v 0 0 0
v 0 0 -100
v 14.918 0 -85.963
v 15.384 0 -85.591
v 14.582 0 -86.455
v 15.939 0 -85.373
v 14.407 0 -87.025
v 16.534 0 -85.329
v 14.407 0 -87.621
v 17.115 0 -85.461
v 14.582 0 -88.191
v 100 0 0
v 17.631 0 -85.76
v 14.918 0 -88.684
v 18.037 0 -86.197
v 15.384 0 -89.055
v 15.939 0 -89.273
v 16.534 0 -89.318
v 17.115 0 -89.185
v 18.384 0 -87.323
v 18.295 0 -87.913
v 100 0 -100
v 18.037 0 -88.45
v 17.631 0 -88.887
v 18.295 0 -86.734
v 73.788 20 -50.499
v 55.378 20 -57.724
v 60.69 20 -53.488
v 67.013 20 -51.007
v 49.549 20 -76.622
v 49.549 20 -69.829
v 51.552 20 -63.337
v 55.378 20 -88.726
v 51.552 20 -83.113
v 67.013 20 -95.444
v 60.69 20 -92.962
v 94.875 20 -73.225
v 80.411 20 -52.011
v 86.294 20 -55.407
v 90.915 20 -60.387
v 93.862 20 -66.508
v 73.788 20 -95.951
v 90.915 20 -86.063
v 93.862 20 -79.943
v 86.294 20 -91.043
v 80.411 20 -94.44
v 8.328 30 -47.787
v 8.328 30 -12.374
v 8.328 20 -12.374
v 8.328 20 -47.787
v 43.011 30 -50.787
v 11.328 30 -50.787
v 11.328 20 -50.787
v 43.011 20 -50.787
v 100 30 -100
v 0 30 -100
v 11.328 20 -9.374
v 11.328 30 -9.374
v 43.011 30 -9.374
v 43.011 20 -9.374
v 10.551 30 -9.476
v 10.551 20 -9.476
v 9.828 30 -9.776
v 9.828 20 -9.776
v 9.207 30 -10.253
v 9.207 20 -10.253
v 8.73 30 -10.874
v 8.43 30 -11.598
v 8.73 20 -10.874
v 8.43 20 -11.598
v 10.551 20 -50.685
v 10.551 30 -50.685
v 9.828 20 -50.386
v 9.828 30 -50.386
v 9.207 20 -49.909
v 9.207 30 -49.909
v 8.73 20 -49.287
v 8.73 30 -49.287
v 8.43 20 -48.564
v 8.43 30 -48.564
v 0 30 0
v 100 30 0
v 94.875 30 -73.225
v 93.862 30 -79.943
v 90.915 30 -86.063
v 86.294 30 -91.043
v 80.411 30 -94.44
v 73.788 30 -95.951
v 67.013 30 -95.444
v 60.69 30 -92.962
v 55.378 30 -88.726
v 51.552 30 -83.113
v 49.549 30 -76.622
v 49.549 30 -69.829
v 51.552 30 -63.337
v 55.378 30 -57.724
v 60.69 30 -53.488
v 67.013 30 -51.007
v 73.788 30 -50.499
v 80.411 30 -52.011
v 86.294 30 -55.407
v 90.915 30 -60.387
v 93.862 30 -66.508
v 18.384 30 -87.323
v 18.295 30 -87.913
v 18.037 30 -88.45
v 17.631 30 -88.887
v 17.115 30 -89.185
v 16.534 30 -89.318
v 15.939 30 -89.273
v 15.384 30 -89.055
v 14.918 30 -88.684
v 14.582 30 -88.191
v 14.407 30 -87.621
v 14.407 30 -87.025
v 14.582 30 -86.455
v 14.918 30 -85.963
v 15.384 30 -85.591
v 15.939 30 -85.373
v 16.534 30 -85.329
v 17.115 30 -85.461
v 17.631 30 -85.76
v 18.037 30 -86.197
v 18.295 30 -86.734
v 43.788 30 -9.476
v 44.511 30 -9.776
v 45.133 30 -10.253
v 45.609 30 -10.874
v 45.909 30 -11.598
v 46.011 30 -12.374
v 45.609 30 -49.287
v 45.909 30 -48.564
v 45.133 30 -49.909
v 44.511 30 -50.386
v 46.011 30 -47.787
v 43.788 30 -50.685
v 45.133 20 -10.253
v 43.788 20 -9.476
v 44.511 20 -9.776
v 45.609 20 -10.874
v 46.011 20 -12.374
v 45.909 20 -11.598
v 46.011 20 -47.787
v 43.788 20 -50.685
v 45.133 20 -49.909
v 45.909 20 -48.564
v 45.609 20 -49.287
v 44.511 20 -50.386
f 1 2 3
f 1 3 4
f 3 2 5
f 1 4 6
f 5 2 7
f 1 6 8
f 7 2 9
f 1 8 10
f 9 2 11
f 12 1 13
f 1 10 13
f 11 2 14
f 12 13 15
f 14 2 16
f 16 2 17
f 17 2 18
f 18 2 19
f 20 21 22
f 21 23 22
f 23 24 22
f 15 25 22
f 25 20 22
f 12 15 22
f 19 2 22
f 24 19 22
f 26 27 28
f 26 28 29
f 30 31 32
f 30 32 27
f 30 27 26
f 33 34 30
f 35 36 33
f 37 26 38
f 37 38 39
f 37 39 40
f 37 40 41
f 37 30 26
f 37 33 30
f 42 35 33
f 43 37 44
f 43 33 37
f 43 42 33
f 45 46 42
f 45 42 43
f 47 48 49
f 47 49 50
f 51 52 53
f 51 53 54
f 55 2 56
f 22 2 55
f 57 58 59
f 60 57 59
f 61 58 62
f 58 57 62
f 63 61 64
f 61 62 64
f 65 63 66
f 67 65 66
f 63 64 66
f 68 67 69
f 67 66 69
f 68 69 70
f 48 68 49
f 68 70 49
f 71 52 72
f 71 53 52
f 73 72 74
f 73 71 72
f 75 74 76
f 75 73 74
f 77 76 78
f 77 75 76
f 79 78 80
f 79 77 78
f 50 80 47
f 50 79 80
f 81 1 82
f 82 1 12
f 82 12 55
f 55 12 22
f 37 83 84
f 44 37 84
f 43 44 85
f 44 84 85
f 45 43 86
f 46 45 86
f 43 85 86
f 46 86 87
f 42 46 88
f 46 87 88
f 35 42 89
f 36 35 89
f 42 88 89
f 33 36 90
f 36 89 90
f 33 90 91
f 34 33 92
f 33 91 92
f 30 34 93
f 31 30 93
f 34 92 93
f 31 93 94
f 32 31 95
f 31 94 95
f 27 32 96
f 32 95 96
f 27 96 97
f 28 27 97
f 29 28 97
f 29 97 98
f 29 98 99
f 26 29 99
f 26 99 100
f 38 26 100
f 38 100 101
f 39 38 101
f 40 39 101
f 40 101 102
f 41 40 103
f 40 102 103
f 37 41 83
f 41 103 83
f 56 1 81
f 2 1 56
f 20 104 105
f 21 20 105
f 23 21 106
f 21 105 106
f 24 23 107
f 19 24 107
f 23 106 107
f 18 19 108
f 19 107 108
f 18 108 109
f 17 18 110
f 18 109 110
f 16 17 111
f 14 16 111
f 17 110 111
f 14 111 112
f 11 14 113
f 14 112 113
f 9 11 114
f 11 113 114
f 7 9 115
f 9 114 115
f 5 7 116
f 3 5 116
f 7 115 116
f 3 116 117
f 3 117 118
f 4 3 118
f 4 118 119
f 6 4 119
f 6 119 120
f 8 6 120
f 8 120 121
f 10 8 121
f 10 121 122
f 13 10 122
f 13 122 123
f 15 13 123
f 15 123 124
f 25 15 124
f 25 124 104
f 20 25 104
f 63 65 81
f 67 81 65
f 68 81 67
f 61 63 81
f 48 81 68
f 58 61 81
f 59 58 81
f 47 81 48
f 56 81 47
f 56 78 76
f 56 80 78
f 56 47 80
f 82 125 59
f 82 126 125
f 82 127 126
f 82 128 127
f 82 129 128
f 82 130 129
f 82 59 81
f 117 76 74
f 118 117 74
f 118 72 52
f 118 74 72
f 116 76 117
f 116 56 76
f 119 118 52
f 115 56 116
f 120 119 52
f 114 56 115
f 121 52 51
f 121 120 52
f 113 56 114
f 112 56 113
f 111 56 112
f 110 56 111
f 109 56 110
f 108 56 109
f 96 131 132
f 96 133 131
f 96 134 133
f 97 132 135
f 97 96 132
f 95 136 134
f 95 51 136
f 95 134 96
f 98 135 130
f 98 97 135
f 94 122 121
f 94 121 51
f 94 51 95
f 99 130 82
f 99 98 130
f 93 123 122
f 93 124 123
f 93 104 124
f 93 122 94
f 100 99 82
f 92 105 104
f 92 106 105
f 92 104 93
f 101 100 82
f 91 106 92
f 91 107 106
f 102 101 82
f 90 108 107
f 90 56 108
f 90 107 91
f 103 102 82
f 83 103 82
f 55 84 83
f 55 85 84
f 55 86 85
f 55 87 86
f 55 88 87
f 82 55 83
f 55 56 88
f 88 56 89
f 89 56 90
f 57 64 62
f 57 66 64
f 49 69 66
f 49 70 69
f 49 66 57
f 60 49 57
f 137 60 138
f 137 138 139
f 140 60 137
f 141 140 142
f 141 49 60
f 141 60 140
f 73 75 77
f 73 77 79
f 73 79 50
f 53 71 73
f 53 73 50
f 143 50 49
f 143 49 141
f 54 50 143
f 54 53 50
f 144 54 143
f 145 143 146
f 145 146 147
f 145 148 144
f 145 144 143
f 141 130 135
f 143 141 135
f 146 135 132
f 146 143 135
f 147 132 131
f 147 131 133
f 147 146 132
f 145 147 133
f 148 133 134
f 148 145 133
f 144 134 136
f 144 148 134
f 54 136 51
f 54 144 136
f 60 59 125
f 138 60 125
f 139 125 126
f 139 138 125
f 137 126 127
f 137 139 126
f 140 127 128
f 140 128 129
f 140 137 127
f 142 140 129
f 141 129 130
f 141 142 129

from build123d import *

# Parameters (mm, degrees)
SKETCH1_W           = 100
SKETCH1_H           = 100
BOSS_EXTRUDE1_DEPTH = 30
SKETCH5_R           = 2
CUT_EXTRUDE1_DEPTH  = 31
SKETCH7_R           = 22.78996388
SKETCH7_W           = 37.683489423
SKETCH7_H           = 41.413312703
CUT_EXTRUDE2_DEPTH  = 10
FILLET1_R           = 3


with BuildPart() as part:
    # Sketch1 → Boss-Extrude1 (new body)
    with BuildSketch(Plane(origin=(0, 0, 0), x_dir=(1, 0, 0), z_dir=(0, 1, 0))):
        with Locations((50, 50)):
            Rectangle(SKETCH1_W, SKETCH1_H)
    extrude(amount=BOSS_EXTRUDE1_DEPTH)

    # Sketch5 → Cut-Extrude1 (cut, through all)
    with BuildSketch(Plane(origin=(0, 30, 0), x_dir=(1, 0, 0), z_dir=(0, 1, 0))):
        with Locations((16.384313545, 87.323198024)):
            Circle(SKETCH5_R)
    extrude(amount=-CUT_EXTRUDE1_DEPTH, mode=Mode.SUBTRACT)

    # Sketch7 → Cut-Extrude2 (cut)
    with BuildSketch(Plane(origin=(0, 30, 0), x_dir=(1, 0, 0), z_dir=(0, 1, 0))):
        with Locations((72.084640228, 73.225170758)):
            Circle(SKETCH7_R)
        with Locations((27.16963915, 30.080771209)):
            Rectangle(SKETCH7_W, SKETCH7_H)
    extrude(amount=-CUT_EXTRUDE2_DEPTH, mode=Mode.SUBTRACT)

    # Fillet1
    fillet1_edges = [part.edges().sort_by_distance(p)[0] for p in [
        (8.327894438, 25, -9.374114858),
        (8.327894438, 25, -50.787427561),
        (46.011383861, 25, -50.787427561),
        (46.011383861, 25, -9.374114858),
    ]]
    fillet(fillet1_edges, radius=FILLET1_R)


solid = part.part
